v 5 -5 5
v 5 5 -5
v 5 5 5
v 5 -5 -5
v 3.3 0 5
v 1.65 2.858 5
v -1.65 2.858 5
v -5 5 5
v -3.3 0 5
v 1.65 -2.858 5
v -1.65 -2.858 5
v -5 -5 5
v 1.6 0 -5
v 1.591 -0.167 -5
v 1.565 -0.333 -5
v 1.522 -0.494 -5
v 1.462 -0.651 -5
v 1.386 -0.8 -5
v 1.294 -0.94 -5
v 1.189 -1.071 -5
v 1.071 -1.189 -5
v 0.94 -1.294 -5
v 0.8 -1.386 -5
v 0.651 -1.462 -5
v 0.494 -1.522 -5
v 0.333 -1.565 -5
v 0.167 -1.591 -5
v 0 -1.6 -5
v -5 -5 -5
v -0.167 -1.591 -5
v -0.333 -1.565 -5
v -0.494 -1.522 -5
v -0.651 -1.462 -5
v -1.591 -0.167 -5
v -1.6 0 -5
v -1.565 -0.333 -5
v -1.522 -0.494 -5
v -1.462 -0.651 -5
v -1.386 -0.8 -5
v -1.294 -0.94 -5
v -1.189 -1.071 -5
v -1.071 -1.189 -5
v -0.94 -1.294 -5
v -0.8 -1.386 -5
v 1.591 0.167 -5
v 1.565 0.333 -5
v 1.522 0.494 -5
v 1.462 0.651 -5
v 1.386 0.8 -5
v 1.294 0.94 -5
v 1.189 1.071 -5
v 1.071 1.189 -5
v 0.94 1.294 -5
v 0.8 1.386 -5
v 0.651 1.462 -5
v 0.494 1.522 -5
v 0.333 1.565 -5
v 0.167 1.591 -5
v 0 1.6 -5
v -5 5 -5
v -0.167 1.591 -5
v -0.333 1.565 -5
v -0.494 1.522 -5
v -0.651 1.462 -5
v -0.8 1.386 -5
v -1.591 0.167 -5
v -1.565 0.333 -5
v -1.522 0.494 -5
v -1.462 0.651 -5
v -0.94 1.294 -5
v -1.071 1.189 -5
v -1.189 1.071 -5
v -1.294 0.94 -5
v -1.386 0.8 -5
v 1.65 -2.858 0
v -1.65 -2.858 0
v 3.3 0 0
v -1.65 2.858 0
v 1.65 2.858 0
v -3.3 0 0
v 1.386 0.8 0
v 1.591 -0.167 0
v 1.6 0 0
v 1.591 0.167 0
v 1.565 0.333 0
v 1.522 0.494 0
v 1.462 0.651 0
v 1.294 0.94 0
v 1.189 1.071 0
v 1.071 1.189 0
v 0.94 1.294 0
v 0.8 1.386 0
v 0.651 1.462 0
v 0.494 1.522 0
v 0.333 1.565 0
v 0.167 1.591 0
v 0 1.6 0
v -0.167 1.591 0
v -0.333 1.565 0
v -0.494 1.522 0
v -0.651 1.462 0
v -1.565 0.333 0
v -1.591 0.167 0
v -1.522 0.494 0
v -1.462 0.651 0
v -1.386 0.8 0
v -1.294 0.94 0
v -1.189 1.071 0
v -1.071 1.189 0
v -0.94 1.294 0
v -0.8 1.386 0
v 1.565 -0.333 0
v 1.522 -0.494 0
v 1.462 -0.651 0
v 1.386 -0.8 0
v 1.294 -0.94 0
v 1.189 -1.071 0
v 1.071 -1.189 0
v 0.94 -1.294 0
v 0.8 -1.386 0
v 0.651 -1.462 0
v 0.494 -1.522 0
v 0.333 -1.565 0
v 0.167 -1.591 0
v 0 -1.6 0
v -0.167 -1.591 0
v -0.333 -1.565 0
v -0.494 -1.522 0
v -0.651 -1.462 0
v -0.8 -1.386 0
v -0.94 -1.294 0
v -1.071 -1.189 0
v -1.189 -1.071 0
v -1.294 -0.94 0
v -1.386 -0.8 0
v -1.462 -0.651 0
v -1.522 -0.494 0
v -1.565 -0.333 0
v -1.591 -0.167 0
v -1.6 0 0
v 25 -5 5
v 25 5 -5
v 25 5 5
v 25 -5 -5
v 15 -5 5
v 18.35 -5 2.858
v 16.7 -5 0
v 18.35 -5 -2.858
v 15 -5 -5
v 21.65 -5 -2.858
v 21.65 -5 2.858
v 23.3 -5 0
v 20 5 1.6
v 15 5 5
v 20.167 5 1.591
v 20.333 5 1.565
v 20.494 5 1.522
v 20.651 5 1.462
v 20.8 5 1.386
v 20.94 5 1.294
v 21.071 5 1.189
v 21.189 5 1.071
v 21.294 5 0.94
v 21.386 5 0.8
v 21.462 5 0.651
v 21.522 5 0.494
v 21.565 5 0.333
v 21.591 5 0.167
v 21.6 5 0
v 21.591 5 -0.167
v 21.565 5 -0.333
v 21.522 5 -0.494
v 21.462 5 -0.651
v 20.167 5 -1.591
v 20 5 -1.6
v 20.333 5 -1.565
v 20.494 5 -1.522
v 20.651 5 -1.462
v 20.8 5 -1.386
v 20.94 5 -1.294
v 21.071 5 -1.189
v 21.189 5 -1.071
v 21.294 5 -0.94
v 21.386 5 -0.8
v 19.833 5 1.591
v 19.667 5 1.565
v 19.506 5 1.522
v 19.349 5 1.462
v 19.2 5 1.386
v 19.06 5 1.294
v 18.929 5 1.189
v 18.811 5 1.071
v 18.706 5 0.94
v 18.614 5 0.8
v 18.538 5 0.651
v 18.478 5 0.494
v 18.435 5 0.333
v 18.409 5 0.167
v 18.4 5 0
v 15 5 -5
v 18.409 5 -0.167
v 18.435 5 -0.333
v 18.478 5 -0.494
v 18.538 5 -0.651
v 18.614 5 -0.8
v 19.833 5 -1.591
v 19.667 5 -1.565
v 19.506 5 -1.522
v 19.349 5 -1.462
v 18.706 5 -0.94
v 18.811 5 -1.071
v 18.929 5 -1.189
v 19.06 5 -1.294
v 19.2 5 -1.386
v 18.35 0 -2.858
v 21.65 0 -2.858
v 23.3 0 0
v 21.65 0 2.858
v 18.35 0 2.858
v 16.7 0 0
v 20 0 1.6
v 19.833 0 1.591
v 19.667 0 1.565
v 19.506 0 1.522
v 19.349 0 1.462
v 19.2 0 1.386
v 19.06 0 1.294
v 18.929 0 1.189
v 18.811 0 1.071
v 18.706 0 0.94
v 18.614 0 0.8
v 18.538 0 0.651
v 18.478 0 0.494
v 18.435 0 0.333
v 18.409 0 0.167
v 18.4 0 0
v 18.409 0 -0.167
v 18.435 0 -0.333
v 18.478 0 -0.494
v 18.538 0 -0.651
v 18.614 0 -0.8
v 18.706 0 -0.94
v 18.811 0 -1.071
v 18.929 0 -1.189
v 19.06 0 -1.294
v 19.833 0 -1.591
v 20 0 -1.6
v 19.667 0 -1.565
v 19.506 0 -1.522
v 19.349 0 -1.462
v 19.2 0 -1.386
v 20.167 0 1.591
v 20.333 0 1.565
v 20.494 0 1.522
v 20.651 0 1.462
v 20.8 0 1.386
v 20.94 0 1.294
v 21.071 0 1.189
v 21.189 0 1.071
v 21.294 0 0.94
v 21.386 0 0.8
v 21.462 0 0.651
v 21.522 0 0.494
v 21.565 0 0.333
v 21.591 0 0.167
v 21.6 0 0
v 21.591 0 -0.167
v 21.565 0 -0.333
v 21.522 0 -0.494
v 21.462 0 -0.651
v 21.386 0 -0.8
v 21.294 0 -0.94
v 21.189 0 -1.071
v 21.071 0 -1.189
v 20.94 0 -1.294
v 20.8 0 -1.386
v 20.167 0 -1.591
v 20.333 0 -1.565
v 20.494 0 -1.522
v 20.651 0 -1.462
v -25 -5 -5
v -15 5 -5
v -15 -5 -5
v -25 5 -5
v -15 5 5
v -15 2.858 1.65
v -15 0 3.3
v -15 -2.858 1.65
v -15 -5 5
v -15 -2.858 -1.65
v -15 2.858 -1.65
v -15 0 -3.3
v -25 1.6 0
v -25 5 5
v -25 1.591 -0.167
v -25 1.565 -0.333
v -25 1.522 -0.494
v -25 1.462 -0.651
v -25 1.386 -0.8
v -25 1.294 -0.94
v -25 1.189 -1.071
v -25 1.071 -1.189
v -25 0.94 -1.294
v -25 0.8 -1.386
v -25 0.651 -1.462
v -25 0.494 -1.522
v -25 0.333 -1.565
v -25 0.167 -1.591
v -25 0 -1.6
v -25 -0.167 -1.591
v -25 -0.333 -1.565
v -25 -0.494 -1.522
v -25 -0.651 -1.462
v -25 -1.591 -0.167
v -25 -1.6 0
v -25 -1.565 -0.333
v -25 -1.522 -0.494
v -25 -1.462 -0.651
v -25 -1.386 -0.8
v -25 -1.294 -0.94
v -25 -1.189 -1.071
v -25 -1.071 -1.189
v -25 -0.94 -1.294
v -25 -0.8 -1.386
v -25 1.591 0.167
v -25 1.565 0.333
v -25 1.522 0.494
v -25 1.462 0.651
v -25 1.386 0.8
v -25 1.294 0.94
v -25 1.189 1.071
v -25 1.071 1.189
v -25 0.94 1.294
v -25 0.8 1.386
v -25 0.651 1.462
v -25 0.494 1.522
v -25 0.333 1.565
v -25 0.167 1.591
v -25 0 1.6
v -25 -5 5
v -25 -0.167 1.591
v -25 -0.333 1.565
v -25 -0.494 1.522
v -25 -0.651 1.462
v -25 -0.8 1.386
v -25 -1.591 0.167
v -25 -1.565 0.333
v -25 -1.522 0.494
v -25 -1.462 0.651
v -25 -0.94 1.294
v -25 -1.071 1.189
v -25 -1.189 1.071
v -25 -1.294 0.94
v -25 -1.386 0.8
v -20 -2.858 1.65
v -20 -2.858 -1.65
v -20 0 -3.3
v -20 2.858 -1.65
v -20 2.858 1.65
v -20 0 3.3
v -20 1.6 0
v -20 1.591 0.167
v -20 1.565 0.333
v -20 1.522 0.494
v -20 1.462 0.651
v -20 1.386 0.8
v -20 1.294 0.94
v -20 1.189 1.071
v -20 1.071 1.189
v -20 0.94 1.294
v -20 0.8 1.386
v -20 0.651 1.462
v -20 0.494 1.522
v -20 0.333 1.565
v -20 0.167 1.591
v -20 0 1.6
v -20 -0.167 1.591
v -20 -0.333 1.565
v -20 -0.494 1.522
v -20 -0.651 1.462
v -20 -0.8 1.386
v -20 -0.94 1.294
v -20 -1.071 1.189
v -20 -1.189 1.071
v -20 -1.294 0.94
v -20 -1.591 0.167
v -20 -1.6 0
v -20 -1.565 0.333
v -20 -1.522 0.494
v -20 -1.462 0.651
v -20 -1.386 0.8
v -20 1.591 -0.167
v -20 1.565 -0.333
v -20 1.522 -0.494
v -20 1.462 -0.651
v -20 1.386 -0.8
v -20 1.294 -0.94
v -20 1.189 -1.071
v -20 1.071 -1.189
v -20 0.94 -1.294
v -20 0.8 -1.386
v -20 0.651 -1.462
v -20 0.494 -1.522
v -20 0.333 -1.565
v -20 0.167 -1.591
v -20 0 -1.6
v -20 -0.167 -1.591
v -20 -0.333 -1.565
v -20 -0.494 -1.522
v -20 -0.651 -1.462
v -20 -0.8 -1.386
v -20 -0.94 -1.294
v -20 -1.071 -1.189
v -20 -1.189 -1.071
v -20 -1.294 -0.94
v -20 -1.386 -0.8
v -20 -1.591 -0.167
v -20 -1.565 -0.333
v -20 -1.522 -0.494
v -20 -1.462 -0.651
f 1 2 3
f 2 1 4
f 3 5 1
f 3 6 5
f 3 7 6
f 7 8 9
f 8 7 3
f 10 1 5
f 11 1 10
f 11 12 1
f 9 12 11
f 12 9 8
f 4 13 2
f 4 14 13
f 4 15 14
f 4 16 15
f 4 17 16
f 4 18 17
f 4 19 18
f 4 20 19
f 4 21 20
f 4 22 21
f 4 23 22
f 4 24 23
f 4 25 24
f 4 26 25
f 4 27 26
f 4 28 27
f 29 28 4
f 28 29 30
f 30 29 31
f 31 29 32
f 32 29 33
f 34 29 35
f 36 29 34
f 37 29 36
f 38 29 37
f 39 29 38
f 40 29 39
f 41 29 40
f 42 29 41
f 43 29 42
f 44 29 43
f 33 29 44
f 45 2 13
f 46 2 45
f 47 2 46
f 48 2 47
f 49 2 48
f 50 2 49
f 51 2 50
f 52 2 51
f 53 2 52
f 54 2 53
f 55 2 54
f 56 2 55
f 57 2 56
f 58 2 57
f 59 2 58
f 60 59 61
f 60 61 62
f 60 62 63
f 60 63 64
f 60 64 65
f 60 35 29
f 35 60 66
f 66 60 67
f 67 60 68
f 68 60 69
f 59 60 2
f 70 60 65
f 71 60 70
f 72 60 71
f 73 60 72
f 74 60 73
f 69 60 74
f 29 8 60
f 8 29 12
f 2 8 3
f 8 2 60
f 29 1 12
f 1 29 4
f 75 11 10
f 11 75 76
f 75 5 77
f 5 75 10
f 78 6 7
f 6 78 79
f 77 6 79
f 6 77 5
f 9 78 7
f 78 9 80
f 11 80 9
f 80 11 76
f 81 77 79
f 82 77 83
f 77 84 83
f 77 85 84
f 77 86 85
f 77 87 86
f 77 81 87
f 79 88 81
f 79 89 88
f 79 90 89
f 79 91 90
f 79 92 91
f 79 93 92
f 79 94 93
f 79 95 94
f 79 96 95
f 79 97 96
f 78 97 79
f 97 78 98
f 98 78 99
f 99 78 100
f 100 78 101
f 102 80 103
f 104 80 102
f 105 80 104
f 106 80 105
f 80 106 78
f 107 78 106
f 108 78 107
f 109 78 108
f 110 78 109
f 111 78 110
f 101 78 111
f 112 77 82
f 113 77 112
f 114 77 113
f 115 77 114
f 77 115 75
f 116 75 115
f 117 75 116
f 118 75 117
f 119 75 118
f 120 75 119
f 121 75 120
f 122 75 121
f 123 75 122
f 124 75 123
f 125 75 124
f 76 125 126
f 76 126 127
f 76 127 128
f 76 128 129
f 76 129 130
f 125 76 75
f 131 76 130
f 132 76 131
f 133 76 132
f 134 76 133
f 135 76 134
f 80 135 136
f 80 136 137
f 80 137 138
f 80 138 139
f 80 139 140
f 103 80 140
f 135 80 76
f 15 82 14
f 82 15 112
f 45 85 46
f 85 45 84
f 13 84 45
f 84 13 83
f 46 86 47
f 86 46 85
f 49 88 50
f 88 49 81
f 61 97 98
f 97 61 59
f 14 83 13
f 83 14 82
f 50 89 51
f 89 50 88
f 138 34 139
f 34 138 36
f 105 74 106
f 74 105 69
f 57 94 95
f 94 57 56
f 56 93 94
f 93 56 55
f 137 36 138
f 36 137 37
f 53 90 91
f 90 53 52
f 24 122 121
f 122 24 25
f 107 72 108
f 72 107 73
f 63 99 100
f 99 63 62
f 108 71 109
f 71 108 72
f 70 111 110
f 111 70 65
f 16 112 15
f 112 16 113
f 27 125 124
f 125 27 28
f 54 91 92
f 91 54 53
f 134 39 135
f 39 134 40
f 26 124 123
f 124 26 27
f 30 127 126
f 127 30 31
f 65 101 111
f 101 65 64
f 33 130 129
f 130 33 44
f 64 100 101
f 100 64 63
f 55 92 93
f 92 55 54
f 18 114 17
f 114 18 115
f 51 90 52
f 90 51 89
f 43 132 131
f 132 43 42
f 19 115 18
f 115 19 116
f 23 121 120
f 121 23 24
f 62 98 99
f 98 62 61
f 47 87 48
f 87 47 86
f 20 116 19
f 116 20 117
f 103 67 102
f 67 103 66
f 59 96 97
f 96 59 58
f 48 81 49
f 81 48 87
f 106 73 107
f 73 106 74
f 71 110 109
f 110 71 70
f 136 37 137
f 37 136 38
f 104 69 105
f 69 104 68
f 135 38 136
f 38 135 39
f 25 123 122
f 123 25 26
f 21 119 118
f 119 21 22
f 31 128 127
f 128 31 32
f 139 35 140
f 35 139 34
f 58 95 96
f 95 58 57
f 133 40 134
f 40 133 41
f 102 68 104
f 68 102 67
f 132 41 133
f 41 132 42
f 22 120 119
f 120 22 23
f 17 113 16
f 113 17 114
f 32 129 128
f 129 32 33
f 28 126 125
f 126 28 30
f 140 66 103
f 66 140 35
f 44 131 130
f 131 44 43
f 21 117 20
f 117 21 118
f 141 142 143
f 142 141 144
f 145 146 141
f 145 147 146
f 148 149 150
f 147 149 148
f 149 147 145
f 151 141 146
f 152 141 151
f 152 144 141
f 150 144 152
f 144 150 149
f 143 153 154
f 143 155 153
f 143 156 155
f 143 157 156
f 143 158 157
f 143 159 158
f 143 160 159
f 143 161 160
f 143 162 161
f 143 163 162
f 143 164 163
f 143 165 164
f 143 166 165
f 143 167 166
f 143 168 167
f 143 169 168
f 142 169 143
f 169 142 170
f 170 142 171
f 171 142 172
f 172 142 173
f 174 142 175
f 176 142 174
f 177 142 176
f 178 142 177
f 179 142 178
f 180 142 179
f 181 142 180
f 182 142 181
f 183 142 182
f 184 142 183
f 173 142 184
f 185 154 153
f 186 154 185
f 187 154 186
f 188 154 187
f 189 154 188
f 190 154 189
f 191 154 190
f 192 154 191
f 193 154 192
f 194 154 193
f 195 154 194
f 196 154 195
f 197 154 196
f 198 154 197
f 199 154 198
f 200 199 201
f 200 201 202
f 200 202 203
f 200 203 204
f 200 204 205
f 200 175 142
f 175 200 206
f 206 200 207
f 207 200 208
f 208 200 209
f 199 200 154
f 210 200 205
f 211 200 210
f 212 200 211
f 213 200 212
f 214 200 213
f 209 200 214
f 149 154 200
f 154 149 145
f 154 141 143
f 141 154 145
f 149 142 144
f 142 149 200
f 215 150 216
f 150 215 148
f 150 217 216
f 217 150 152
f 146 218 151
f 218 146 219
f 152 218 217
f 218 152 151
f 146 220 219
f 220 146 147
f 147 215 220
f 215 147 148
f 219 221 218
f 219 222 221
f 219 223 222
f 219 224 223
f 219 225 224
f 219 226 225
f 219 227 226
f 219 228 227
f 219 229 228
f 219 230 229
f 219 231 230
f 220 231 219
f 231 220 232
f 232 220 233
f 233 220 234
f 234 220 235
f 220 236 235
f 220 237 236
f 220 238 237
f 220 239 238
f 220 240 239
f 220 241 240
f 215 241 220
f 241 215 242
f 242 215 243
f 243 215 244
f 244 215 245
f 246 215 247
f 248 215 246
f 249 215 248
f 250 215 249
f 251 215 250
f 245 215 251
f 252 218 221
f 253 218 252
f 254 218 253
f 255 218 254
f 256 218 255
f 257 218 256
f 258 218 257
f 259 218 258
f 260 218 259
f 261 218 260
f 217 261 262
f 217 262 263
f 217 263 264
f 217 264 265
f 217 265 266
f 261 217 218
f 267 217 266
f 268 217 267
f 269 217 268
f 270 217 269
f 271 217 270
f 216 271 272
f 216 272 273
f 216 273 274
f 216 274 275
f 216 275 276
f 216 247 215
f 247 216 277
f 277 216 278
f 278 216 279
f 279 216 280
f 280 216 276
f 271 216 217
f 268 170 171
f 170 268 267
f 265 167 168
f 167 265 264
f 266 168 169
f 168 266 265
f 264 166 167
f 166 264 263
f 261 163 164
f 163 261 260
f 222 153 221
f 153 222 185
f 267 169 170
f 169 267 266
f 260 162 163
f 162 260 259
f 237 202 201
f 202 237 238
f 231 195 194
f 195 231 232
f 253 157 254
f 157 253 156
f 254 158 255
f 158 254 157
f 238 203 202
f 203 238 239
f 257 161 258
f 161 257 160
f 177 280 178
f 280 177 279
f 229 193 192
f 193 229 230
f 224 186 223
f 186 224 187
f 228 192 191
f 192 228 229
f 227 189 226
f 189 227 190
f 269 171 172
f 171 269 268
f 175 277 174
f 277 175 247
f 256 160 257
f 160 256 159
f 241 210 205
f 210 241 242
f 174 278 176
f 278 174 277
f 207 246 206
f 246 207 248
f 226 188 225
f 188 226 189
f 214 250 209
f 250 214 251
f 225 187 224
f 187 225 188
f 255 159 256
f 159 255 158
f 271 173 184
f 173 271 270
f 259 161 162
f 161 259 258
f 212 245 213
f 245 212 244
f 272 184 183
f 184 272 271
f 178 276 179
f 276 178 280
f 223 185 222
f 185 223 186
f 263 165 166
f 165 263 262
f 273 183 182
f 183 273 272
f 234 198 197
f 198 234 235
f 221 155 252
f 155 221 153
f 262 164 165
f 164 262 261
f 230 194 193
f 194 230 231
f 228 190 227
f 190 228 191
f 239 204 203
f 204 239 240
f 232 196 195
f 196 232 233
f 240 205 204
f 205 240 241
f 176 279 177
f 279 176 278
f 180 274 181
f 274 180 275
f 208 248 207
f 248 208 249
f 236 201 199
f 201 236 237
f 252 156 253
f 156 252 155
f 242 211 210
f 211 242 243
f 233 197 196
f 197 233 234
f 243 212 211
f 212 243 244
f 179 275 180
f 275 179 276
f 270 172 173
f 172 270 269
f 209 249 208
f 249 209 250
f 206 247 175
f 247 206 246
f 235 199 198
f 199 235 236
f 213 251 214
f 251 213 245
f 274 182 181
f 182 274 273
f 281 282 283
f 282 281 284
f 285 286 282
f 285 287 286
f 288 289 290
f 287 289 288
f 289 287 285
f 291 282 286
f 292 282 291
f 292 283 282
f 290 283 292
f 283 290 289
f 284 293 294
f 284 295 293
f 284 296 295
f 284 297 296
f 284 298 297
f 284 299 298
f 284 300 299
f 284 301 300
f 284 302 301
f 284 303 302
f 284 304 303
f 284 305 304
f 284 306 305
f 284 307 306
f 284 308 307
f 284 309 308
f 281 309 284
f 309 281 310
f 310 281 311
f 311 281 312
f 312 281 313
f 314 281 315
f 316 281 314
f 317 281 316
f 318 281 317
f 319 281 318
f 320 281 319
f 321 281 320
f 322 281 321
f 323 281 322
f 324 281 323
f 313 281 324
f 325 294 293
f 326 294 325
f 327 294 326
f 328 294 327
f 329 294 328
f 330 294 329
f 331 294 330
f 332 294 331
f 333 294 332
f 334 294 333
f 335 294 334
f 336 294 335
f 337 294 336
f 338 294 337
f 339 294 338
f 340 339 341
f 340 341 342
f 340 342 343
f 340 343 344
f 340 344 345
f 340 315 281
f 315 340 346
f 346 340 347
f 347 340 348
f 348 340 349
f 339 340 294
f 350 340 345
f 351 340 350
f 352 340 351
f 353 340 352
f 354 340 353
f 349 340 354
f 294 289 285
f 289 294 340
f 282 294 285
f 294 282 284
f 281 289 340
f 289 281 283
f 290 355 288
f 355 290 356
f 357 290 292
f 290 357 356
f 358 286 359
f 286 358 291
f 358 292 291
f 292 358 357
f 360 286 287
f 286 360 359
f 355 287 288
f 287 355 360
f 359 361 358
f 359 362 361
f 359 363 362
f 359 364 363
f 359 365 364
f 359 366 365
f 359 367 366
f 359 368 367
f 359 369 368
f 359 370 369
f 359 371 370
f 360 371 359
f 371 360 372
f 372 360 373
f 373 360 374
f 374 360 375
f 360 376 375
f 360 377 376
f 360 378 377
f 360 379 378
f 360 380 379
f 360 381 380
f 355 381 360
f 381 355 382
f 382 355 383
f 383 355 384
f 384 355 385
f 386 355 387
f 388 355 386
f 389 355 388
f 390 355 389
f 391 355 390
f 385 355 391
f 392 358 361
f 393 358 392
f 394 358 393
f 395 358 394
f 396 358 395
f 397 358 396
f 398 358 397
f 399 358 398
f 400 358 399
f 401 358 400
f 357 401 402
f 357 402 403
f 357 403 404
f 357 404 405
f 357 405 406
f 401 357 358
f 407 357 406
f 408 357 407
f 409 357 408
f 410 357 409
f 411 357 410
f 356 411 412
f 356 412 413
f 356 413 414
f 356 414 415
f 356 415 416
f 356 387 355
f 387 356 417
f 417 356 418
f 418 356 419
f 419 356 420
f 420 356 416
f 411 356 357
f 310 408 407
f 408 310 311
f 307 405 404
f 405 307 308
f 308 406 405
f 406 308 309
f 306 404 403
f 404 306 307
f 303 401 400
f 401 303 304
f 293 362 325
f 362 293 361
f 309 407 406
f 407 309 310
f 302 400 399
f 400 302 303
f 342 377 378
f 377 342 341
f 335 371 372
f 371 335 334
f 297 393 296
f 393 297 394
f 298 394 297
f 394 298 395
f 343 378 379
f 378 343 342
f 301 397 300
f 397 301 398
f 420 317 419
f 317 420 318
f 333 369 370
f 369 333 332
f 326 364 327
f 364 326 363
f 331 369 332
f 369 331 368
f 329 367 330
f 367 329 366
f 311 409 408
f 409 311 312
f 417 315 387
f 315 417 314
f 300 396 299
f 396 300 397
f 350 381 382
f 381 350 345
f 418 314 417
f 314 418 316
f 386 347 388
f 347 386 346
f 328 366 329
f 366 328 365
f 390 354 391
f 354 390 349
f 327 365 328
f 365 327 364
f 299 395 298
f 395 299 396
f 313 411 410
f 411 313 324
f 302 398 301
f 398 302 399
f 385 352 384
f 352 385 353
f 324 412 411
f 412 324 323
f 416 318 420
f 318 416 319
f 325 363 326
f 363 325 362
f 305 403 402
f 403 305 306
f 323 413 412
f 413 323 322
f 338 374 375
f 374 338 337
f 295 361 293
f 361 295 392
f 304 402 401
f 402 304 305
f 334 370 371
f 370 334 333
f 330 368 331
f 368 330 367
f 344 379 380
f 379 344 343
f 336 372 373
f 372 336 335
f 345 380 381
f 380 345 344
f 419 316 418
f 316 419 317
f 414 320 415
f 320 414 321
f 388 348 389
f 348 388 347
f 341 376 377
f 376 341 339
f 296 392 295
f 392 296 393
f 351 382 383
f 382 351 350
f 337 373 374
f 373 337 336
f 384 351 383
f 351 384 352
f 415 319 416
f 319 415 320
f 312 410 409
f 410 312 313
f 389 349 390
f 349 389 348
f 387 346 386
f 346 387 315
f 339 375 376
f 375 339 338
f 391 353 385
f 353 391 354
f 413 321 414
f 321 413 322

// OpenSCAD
// file: ../../parameters.scad
maximum_printable_size = 150;

layer_thickness = 0.3;
global_clearance = 0.5;


//Screw diameter and nut for M10 [mm]
M10_screw_diameter = 10.4;
M10_head_height = 10;
M10_head_diameter = 16+0.5;
M10_nut_height = 10.5;
M10_nut_diameter = 25.5;
M10_nut_pocket = 22.3;

//Screw diameter for M8 [mm]
M8_screw_diameter = 8.6;
M8_head_height = 8;
M8_head_diameter = 13.5;
M8_nut_height = 7.5;
M8_square_nut_thin_height = 4.5;
M8_nut_diameter = 14.4 + 0.5;
M8_nut_pocket = 13 + 0.5;
M8_washer_diameter = 16;
M8_washer_thickness = 1.5;


//Screw diameter and nut for M6 [mm]
M6_screw_diameter=6.5;
M6_head_diameter = 10+0.5;
M6_head_height = 6;
M6_nut_height = 4.9;
M6_nut_diameter = 11.8;
M6_nut_pocket = 10.4;
M6_square_nut_height = 3;
M6_square_nut_diameter = 10;
M6_washer_thickness = 1.6;

//Screw diameter and nut for M5 [mm]
M5_screw_diameter=5.5;
M5_head_height = 5;
M5_head_diameter = 13+0.5;
M5_nut_height = 4.5;
M5_nut_diameter = 9.4;
M5_nut_pocket = 8.4;

//Screw diameter and nut for M4 [mm]
M4_screw_diameter=4.5;
M4_screw_head_height = 4;
M4_nut_height = 3.2;
M4_nut_diameter = 8.4;
M4_nut_pocket = 7.5;

//Screw diameter and nut for M3 [mm]
M3_screw_diameter = 3.2;
M3_nut_height = 2.7;
M3_nut_diameter = 6.6;
M3_nut_pocket = 5.6;
M3_screw_head_height = 3;

//Screw diameter and nut for M2,5 [mm]
M2_5_screw_diameter = 2.7;
M2_5_nut_height = 2.3;
M2_5_nut_diameter = 6;
M2_5_nut_pocket = 5.5;

//ALU profile
ALU_profile_width = 30.5;
ALU_profile_holder_wall_thickness = 3;
ALU_profile_groove_width = 8;





// Platform parameters ////////////////////////////////////////////
// Main profile parameters
starting_platform_length = 1000; // Main platform profile length
starting_platform_angle = 10; // Angle of attack for platform

// Main cube profile lengths
profile_length_x = 600;
profile_length_y = 600;
profile_length_z = 260;


// Compressor dimensions
compressor_length_x = 410;
compressor_length_y = 140;
compressor_length_z = 310;

// Platform front support parameters
front_holder_width = 160;
front_holder_angle = 25;
front_holder_height = 60;
front_holder_offset = 15;
front_holder_height_offset = 110;

// Lock moving servo parameters
// static par.
servo_length = 40;
servo_width = 20;
servo_height = 40;
servo_axle_offset = 12.5;
servo_axle_height = 5;
servo_movement_angle = 60;
servo_movement_angle_offset = -35; // angle offset up
servo_force = 1.65; // [N/m] torque of servo

// dynamic par.
servo_arm_length = servo_width/2+ALU_profile_width/2+ALU_profile_holder_wall_thickness+4;
servo_travel_y = cos((servo_movement_angle-abs(servo_movement_angle_offset))/2)*servo_arm_length;
servo_arm_hole_length = (servo_arm_length/cos(servo_movement_angle/2))-servo_arm_length+M3_screw_diameter;
servo_joint_offset = sin(servo_movement_angle+servo_movement_angle_offset)*(servo_arm_length+servo_arm_hole_length)+servo_axle_offset;
servo_joint_offset_by_angle = -tan(servo_movement_angle_offset)*servo_arm_length;
servo_max_linear_force = servo_force/(servo_arm_length/1000); // max servo linear force [N]
servo_min_linear_force = cos(servo_movement_angle+abs(servo_movement_angle_offset))*servo_max_linear_force; // min servo linear force [N] in the most extreme position
servo_holding_linear_force = cos(servo_movement_angle+servo_movement_angle_offset)*servo_max_linear_force; // min servo linear force [N] in holding position

// Lock static parameters
lock_screws_dia = 3.2;
lock_depth = 20;
lock_axle_diameter = 15;
lock_grab_axle_dia = 13;
lock_arms_joint_offset = 30;
lock_arms_joint_angle = 90-.01;
lock_tooth_width = 2;

lock_tube_angle = 0;

// Lock dynamic parameters
lock_push_force = (servo_holding_linear_force/cos(lock_arms_joint_angle))/cos(lock_arms_joint_angle); // lock arm pushing force on linear servo joint
lock_push_arm_length = 45;
lock_arm_force_ratio = 1; // lock arm change holding force ratio (0.5 = arm will have half holding force)
lock_hold_arm_length = lock_push_arm_length/lock_arm_force_ratio;
lock_holding_force = lock_push_force*lock_arm_force_ratio;
lock_joint_arm_length = lock_push_arm_length;
// main file
//@set_slicing_config(../../slicing/gensupport.ini)
include <../../parameters.scad>

//cube([10,10,10]);

c=10;
d1=3.2;
d2=6.6;

module cube_with_screw_nut()
{
    difference()
    {
    cube([c,c,c],center=true);
    
    cylinder(d=d2,h=30,$fn=6);
    translate([0,0,-20])
    cylinder(d=d1,h=30,$fn=60);
    }
}

cube_with_screw_nut();

translate([20,0,0])
rotate([90,0,0])
cube_with_screw_nut();

translate([-20,0,0])
rotate([0,90,0])
cube_with_screw_nut();
